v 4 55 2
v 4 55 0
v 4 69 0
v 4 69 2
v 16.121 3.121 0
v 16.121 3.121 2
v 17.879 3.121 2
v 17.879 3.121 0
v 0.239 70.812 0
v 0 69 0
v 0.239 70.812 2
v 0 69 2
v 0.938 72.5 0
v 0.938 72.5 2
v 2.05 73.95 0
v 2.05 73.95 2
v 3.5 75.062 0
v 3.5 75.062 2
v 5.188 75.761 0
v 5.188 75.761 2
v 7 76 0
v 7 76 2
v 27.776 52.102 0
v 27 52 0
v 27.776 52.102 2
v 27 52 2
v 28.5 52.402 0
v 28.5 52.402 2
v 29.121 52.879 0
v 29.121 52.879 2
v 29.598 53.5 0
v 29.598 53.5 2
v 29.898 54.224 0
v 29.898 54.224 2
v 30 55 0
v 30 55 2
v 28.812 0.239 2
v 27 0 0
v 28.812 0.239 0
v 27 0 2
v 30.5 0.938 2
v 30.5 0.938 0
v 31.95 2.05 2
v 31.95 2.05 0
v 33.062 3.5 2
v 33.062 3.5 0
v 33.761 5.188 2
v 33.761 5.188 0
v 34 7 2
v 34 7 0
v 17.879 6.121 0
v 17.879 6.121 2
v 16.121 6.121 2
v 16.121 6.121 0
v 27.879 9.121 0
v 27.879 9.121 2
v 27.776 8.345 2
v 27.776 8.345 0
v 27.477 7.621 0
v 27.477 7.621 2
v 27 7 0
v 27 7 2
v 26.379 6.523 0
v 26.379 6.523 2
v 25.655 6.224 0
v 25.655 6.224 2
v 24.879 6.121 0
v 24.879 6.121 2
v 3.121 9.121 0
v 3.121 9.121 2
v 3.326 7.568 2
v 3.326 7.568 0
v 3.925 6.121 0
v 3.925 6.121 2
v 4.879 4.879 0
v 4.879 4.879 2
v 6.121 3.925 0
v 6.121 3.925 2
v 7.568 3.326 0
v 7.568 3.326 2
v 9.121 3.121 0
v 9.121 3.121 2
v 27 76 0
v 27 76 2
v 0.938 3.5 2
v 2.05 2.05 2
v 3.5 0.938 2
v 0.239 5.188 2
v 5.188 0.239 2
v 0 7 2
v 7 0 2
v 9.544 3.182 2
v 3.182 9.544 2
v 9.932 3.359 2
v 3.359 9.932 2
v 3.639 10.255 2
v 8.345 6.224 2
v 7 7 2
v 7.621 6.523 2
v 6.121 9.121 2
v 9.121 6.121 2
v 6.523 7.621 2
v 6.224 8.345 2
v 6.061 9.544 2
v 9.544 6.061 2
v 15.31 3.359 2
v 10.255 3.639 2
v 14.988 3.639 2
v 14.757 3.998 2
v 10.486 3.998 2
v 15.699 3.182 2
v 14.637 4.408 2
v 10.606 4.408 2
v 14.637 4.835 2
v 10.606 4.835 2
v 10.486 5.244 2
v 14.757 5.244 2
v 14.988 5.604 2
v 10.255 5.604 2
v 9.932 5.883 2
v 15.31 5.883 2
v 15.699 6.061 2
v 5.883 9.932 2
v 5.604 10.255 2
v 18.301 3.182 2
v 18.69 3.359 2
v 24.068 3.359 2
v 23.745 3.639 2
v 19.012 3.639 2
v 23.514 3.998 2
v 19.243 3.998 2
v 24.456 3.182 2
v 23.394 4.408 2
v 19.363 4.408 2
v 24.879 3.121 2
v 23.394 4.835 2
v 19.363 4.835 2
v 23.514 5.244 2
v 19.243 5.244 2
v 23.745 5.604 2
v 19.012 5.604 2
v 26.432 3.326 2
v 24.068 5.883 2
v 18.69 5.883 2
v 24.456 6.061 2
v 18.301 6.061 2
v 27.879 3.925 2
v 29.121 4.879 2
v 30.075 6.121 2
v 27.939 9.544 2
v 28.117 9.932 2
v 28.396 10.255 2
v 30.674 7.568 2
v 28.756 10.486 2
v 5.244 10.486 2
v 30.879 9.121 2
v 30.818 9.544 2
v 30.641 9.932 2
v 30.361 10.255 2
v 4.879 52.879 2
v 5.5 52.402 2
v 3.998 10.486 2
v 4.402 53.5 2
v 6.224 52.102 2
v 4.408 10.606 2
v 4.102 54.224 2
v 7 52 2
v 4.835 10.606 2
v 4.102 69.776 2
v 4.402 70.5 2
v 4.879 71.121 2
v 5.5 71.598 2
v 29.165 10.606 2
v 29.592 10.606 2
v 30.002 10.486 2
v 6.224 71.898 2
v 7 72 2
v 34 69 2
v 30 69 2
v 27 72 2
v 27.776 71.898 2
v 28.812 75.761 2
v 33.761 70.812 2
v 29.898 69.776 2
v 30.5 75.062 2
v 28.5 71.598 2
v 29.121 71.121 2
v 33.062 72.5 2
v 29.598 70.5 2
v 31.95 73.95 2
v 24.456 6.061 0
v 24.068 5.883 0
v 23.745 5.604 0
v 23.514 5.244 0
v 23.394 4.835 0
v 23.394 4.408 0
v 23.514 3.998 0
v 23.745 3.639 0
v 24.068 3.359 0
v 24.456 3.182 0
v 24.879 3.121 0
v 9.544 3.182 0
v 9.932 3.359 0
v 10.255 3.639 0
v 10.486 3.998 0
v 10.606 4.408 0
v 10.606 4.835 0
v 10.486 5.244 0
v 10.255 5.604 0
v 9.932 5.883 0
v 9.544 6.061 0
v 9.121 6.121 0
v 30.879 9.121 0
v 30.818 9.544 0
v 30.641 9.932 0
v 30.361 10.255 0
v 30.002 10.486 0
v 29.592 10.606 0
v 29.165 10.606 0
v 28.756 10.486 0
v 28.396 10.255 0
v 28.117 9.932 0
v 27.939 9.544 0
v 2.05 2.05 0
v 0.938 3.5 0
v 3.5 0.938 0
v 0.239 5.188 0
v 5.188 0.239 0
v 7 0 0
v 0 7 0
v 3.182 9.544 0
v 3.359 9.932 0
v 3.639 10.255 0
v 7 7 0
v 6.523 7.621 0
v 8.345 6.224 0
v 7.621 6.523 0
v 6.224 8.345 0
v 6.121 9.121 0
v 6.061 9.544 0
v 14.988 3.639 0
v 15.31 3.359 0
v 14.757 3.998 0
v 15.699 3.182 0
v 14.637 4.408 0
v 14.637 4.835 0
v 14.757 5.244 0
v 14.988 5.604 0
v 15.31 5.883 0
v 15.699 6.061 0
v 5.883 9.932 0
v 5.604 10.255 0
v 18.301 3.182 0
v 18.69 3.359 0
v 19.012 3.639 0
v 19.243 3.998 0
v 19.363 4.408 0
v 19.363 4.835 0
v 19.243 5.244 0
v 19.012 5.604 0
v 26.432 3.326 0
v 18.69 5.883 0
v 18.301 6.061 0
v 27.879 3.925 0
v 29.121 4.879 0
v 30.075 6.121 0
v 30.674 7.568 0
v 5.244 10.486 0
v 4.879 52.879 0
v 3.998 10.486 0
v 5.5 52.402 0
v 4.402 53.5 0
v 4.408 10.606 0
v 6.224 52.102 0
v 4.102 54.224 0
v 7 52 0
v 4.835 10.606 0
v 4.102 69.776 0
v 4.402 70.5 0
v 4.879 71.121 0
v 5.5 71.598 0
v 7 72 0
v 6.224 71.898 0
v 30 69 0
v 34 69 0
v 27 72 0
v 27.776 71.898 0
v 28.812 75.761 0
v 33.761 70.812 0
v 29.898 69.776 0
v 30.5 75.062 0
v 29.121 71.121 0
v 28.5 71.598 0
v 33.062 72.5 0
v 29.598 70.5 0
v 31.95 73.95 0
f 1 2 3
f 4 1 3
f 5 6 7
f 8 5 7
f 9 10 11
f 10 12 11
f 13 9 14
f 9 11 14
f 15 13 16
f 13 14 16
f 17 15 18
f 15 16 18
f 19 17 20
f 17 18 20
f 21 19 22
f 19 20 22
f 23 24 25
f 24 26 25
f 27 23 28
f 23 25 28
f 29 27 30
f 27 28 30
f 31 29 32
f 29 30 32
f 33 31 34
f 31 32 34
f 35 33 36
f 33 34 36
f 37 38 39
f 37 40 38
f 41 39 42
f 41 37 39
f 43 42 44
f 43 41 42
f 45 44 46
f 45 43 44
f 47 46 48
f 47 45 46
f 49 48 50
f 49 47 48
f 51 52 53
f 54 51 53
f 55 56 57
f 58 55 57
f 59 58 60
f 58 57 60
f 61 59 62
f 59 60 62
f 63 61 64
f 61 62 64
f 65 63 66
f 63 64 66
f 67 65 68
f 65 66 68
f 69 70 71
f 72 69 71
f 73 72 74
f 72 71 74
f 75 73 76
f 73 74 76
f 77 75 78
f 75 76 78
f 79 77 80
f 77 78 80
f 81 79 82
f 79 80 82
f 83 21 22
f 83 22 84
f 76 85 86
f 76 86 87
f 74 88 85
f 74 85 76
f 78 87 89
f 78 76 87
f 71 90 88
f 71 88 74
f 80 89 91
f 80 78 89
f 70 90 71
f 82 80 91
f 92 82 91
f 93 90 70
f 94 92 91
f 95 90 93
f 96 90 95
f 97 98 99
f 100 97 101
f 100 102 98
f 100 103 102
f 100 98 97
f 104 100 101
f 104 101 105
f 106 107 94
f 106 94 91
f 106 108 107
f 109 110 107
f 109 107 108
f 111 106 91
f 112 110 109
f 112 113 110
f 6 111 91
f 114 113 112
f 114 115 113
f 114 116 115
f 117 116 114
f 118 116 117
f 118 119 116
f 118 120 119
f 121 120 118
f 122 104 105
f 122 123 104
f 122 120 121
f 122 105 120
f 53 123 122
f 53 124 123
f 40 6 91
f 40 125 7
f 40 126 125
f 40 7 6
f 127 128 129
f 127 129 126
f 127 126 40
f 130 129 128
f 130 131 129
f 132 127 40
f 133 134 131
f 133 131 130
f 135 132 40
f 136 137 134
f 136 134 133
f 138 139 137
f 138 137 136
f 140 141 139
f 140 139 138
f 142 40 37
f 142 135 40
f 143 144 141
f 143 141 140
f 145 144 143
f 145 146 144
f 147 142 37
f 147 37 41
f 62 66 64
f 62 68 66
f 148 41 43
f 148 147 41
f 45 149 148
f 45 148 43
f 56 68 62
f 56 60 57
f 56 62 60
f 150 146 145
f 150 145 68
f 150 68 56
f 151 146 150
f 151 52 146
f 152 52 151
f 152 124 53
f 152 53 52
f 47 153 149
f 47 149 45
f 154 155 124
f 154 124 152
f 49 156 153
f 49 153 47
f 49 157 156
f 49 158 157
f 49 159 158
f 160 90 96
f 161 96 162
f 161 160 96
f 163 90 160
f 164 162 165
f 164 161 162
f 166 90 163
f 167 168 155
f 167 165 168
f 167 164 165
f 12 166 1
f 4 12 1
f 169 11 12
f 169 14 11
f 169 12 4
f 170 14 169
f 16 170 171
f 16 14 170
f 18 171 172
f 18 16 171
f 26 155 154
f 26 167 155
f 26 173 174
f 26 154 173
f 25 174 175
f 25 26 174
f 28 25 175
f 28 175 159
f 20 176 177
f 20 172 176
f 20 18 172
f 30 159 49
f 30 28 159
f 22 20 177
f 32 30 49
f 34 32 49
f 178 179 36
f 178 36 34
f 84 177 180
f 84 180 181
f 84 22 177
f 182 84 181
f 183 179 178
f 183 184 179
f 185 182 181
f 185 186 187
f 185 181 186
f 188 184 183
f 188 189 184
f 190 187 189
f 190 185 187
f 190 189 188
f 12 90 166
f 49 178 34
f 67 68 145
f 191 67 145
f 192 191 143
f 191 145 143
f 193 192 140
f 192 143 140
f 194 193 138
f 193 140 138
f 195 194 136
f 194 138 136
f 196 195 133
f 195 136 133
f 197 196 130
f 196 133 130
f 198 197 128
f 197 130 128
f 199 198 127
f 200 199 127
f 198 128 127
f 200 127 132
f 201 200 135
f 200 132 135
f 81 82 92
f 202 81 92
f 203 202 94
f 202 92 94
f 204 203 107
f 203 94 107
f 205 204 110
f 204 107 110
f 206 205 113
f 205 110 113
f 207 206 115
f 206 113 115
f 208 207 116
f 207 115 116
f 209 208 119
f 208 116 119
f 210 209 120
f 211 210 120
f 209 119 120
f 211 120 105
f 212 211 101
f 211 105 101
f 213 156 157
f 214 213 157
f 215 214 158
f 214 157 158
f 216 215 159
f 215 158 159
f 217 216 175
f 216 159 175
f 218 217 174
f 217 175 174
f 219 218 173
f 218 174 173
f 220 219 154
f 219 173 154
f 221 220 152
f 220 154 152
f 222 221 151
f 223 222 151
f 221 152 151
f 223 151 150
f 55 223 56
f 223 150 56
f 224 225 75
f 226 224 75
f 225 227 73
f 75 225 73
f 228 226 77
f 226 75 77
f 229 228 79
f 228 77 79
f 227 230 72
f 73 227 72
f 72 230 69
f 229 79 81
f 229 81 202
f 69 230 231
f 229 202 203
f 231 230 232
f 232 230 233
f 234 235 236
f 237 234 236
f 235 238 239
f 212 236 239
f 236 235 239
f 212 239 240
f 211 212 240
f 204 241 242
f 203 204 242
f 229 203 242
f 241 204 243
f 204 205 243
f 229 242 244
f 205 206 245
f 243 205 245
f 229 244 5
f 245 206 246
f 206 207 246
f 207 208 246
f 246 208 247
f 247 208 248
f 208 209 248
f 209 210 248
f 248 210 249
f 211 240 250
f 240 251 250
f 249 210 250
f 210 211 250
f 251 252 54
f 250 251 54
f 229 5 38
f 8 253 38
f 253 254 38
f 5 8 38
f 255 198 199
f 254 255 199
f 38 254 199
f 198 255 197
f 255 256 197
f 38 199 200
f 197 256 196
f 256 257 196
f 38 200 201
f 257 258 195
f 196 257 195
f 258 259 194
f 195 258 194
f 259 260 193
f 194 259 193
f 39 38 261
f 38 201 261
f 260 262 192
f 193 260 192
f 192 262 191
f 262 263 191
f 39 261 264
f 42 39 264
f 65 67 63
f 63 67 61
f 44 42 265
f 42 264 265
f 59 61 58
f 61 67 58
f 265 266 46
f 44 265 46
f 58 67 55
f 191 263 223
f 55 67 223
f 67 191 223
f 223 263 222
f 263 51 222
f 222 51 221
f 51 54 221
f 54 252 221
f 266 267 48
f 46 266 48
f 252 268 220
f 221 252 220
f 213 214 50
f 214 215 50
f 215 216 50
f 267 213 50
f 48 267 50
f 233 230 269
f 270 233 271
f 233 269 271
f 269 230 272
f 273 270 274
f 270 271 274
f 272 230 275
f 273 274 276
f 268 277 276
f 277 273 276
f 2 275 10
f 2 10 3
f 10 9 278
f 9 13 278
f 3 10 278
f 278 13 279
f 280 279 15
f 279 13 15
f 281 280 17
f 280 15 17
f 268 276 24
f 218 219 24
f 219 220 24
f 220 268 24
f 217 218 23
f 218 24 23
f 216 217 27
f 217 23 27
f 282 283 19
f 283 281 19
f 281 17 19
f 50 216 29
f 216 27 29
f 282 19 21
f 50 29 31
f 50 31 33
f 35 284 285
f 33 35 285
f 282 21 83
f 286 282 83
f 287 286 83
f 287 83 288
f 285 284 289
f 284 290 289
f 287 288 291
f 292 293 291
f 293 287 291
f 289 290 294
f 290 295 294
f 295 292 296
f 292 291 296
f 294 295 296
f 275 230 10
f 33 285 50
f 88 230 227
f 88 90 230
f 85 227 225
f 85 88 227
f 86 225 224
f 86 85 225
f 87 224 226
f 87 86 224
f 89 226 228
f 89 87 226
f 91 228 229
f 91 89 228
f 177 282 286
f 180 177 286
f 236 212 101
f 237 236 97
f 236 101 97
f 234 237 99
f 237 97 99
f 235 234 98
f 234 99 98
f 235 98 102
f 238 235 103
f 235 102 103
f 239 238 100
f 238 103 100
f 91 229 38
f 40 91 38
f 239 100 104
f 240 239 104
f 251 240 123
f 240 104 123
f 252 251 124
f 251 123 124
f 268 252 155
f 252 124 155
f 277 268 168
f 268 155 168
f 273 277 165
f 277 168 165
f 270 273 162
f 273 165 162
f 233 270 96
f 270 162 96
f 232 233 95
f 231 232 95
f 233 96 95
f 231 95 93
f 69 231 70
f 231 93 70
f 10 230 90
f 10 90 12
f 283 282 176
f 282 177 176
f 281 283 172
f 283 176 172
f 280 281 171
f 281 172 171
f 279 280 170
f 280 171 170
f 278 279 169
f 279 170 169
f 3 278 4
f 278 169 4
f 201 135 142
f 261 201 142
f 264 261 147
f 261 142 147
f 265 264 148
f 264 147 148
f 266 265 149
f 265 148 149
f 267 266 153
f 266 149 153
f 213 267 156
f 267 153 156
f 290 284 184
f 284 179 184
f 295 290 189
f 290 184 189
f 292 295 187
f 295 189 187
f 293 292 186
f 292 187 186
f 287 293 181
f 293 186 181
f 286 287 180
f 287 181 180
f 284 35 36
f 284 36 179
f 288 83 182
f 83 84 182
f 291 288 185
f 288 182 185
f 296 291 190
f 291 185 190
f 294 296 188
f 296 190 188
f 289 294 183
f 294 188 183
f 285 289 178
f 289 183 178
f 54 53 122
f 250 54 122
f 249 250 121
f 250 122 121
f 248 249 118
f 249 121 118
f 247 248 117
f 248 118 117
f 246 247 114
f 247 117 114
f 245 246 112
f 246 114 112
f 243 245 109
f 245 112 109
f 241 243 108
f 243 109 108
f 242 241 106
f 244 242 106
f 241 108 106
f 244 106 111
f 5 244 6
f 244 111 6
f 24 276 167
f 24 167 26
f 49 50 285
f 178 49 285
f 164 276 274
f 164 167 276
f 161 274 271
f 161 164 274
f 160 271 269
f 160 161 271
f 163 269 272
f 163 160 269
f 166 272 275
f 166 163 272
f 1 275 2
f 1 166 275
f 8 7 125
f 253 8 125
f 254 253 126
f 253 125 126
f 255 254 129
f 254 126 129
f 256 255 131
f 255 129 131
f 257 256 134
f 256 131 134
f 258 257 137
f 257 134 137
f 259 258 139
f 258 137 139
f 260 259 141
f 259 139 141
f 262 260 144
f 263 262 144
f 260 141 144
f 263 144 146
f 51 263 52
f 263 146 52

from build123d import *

# Parameters (mm, degrees)
F0_W     = 34
F0_H     = 76
F0_W_2   = 26
F0_H_2   = 20
F1_DEPTH = 2
F2_R     = 3
F3_R     = 7
F5_DEPTH = 25


with BuildPart() as f1:
    # F0 (on Top) → F1 (new body)
    with BuildSketch(Plane.XY):
        with Locations((17, 38)):
            Rectangle(F0_W, F0_H)
        with Locations((17, 62)):
            Rectangle(F0_W_2, F0_H_2, mode=Mode.SUBTRACT)
    extrude(amount=F1_DEPTH)

    # F2
    f2_edges = [f1.edges().sort_by_distance(p)[0] for p in [
        (4, 72, 1),
        (30, 72, 1),
        (30, 52, 1),
        (4, 52, 1),
    ]]
    fillet(f2_edges, radius=F2_R)

    # F3
    f3_edges = [f1.edges().sort_by_distance(p)[0] for p in [
        (34, 76, 1),
        (0, 76, 1),
        (0, 0, 1),
        (34, 0, 1),
    ]]
    fillet(f3_edges, radius=F3_R)

    # F4 (on face) → F5 (cut)
    with BuildSketch(Plane.XY.offset(2)):
        with BuildLine():
            ThreePointArc((6.12132, 9.12132), (4.62132, 10.62132), (3.12132, 9.12132))
            ThreePointArc((3.12132, 9.12132), (4.87868, 4.87868), (9.12132, 3.12132))
            ThreePointArc((9.12132, 3.12132), (10.62132, 4.62132), (9.12132, 6.12132))
            ThreePointArc((9.12132, 6.12132), (7, 7), (6.12132, 9.12132))
        make_face()
        with BuildLine():
            Line((17.87868, 6.12132), (16.12132, 6.12132))
            ThreePointArc((16.12132, 6.12132), (14.62132, 4.62132), (16.12132, 3.12132))
            Line((16.12132, 3.12132), (17.87868, 3.12132))
            ThreePointArc((17.87868, 3.12132), (19.37868, 4.62132), (17.87868, 6.12132))
        make_face()
        with BuildLine():
            ThreePointArc((27.87868, 9.12132), (27, 7), (24.87868, 6.12132))
            ThreePointArc((24.87868, 6.12132), (23.37868, 4.62132), (24.87868, 3.12132))
            ThreePointArc((24.87868, 3.12132), (29.12132, 4.87868), (30.87868, 9.12132))
            ThreePointArc((30.87868, 9.12132), (29.37868, 10.62132), (27.87868, 9.12132))
        make_face()
    extrude(amount=-F5_DEPTH, mode=Mode.SUBTRACT)


solid = f1.part
